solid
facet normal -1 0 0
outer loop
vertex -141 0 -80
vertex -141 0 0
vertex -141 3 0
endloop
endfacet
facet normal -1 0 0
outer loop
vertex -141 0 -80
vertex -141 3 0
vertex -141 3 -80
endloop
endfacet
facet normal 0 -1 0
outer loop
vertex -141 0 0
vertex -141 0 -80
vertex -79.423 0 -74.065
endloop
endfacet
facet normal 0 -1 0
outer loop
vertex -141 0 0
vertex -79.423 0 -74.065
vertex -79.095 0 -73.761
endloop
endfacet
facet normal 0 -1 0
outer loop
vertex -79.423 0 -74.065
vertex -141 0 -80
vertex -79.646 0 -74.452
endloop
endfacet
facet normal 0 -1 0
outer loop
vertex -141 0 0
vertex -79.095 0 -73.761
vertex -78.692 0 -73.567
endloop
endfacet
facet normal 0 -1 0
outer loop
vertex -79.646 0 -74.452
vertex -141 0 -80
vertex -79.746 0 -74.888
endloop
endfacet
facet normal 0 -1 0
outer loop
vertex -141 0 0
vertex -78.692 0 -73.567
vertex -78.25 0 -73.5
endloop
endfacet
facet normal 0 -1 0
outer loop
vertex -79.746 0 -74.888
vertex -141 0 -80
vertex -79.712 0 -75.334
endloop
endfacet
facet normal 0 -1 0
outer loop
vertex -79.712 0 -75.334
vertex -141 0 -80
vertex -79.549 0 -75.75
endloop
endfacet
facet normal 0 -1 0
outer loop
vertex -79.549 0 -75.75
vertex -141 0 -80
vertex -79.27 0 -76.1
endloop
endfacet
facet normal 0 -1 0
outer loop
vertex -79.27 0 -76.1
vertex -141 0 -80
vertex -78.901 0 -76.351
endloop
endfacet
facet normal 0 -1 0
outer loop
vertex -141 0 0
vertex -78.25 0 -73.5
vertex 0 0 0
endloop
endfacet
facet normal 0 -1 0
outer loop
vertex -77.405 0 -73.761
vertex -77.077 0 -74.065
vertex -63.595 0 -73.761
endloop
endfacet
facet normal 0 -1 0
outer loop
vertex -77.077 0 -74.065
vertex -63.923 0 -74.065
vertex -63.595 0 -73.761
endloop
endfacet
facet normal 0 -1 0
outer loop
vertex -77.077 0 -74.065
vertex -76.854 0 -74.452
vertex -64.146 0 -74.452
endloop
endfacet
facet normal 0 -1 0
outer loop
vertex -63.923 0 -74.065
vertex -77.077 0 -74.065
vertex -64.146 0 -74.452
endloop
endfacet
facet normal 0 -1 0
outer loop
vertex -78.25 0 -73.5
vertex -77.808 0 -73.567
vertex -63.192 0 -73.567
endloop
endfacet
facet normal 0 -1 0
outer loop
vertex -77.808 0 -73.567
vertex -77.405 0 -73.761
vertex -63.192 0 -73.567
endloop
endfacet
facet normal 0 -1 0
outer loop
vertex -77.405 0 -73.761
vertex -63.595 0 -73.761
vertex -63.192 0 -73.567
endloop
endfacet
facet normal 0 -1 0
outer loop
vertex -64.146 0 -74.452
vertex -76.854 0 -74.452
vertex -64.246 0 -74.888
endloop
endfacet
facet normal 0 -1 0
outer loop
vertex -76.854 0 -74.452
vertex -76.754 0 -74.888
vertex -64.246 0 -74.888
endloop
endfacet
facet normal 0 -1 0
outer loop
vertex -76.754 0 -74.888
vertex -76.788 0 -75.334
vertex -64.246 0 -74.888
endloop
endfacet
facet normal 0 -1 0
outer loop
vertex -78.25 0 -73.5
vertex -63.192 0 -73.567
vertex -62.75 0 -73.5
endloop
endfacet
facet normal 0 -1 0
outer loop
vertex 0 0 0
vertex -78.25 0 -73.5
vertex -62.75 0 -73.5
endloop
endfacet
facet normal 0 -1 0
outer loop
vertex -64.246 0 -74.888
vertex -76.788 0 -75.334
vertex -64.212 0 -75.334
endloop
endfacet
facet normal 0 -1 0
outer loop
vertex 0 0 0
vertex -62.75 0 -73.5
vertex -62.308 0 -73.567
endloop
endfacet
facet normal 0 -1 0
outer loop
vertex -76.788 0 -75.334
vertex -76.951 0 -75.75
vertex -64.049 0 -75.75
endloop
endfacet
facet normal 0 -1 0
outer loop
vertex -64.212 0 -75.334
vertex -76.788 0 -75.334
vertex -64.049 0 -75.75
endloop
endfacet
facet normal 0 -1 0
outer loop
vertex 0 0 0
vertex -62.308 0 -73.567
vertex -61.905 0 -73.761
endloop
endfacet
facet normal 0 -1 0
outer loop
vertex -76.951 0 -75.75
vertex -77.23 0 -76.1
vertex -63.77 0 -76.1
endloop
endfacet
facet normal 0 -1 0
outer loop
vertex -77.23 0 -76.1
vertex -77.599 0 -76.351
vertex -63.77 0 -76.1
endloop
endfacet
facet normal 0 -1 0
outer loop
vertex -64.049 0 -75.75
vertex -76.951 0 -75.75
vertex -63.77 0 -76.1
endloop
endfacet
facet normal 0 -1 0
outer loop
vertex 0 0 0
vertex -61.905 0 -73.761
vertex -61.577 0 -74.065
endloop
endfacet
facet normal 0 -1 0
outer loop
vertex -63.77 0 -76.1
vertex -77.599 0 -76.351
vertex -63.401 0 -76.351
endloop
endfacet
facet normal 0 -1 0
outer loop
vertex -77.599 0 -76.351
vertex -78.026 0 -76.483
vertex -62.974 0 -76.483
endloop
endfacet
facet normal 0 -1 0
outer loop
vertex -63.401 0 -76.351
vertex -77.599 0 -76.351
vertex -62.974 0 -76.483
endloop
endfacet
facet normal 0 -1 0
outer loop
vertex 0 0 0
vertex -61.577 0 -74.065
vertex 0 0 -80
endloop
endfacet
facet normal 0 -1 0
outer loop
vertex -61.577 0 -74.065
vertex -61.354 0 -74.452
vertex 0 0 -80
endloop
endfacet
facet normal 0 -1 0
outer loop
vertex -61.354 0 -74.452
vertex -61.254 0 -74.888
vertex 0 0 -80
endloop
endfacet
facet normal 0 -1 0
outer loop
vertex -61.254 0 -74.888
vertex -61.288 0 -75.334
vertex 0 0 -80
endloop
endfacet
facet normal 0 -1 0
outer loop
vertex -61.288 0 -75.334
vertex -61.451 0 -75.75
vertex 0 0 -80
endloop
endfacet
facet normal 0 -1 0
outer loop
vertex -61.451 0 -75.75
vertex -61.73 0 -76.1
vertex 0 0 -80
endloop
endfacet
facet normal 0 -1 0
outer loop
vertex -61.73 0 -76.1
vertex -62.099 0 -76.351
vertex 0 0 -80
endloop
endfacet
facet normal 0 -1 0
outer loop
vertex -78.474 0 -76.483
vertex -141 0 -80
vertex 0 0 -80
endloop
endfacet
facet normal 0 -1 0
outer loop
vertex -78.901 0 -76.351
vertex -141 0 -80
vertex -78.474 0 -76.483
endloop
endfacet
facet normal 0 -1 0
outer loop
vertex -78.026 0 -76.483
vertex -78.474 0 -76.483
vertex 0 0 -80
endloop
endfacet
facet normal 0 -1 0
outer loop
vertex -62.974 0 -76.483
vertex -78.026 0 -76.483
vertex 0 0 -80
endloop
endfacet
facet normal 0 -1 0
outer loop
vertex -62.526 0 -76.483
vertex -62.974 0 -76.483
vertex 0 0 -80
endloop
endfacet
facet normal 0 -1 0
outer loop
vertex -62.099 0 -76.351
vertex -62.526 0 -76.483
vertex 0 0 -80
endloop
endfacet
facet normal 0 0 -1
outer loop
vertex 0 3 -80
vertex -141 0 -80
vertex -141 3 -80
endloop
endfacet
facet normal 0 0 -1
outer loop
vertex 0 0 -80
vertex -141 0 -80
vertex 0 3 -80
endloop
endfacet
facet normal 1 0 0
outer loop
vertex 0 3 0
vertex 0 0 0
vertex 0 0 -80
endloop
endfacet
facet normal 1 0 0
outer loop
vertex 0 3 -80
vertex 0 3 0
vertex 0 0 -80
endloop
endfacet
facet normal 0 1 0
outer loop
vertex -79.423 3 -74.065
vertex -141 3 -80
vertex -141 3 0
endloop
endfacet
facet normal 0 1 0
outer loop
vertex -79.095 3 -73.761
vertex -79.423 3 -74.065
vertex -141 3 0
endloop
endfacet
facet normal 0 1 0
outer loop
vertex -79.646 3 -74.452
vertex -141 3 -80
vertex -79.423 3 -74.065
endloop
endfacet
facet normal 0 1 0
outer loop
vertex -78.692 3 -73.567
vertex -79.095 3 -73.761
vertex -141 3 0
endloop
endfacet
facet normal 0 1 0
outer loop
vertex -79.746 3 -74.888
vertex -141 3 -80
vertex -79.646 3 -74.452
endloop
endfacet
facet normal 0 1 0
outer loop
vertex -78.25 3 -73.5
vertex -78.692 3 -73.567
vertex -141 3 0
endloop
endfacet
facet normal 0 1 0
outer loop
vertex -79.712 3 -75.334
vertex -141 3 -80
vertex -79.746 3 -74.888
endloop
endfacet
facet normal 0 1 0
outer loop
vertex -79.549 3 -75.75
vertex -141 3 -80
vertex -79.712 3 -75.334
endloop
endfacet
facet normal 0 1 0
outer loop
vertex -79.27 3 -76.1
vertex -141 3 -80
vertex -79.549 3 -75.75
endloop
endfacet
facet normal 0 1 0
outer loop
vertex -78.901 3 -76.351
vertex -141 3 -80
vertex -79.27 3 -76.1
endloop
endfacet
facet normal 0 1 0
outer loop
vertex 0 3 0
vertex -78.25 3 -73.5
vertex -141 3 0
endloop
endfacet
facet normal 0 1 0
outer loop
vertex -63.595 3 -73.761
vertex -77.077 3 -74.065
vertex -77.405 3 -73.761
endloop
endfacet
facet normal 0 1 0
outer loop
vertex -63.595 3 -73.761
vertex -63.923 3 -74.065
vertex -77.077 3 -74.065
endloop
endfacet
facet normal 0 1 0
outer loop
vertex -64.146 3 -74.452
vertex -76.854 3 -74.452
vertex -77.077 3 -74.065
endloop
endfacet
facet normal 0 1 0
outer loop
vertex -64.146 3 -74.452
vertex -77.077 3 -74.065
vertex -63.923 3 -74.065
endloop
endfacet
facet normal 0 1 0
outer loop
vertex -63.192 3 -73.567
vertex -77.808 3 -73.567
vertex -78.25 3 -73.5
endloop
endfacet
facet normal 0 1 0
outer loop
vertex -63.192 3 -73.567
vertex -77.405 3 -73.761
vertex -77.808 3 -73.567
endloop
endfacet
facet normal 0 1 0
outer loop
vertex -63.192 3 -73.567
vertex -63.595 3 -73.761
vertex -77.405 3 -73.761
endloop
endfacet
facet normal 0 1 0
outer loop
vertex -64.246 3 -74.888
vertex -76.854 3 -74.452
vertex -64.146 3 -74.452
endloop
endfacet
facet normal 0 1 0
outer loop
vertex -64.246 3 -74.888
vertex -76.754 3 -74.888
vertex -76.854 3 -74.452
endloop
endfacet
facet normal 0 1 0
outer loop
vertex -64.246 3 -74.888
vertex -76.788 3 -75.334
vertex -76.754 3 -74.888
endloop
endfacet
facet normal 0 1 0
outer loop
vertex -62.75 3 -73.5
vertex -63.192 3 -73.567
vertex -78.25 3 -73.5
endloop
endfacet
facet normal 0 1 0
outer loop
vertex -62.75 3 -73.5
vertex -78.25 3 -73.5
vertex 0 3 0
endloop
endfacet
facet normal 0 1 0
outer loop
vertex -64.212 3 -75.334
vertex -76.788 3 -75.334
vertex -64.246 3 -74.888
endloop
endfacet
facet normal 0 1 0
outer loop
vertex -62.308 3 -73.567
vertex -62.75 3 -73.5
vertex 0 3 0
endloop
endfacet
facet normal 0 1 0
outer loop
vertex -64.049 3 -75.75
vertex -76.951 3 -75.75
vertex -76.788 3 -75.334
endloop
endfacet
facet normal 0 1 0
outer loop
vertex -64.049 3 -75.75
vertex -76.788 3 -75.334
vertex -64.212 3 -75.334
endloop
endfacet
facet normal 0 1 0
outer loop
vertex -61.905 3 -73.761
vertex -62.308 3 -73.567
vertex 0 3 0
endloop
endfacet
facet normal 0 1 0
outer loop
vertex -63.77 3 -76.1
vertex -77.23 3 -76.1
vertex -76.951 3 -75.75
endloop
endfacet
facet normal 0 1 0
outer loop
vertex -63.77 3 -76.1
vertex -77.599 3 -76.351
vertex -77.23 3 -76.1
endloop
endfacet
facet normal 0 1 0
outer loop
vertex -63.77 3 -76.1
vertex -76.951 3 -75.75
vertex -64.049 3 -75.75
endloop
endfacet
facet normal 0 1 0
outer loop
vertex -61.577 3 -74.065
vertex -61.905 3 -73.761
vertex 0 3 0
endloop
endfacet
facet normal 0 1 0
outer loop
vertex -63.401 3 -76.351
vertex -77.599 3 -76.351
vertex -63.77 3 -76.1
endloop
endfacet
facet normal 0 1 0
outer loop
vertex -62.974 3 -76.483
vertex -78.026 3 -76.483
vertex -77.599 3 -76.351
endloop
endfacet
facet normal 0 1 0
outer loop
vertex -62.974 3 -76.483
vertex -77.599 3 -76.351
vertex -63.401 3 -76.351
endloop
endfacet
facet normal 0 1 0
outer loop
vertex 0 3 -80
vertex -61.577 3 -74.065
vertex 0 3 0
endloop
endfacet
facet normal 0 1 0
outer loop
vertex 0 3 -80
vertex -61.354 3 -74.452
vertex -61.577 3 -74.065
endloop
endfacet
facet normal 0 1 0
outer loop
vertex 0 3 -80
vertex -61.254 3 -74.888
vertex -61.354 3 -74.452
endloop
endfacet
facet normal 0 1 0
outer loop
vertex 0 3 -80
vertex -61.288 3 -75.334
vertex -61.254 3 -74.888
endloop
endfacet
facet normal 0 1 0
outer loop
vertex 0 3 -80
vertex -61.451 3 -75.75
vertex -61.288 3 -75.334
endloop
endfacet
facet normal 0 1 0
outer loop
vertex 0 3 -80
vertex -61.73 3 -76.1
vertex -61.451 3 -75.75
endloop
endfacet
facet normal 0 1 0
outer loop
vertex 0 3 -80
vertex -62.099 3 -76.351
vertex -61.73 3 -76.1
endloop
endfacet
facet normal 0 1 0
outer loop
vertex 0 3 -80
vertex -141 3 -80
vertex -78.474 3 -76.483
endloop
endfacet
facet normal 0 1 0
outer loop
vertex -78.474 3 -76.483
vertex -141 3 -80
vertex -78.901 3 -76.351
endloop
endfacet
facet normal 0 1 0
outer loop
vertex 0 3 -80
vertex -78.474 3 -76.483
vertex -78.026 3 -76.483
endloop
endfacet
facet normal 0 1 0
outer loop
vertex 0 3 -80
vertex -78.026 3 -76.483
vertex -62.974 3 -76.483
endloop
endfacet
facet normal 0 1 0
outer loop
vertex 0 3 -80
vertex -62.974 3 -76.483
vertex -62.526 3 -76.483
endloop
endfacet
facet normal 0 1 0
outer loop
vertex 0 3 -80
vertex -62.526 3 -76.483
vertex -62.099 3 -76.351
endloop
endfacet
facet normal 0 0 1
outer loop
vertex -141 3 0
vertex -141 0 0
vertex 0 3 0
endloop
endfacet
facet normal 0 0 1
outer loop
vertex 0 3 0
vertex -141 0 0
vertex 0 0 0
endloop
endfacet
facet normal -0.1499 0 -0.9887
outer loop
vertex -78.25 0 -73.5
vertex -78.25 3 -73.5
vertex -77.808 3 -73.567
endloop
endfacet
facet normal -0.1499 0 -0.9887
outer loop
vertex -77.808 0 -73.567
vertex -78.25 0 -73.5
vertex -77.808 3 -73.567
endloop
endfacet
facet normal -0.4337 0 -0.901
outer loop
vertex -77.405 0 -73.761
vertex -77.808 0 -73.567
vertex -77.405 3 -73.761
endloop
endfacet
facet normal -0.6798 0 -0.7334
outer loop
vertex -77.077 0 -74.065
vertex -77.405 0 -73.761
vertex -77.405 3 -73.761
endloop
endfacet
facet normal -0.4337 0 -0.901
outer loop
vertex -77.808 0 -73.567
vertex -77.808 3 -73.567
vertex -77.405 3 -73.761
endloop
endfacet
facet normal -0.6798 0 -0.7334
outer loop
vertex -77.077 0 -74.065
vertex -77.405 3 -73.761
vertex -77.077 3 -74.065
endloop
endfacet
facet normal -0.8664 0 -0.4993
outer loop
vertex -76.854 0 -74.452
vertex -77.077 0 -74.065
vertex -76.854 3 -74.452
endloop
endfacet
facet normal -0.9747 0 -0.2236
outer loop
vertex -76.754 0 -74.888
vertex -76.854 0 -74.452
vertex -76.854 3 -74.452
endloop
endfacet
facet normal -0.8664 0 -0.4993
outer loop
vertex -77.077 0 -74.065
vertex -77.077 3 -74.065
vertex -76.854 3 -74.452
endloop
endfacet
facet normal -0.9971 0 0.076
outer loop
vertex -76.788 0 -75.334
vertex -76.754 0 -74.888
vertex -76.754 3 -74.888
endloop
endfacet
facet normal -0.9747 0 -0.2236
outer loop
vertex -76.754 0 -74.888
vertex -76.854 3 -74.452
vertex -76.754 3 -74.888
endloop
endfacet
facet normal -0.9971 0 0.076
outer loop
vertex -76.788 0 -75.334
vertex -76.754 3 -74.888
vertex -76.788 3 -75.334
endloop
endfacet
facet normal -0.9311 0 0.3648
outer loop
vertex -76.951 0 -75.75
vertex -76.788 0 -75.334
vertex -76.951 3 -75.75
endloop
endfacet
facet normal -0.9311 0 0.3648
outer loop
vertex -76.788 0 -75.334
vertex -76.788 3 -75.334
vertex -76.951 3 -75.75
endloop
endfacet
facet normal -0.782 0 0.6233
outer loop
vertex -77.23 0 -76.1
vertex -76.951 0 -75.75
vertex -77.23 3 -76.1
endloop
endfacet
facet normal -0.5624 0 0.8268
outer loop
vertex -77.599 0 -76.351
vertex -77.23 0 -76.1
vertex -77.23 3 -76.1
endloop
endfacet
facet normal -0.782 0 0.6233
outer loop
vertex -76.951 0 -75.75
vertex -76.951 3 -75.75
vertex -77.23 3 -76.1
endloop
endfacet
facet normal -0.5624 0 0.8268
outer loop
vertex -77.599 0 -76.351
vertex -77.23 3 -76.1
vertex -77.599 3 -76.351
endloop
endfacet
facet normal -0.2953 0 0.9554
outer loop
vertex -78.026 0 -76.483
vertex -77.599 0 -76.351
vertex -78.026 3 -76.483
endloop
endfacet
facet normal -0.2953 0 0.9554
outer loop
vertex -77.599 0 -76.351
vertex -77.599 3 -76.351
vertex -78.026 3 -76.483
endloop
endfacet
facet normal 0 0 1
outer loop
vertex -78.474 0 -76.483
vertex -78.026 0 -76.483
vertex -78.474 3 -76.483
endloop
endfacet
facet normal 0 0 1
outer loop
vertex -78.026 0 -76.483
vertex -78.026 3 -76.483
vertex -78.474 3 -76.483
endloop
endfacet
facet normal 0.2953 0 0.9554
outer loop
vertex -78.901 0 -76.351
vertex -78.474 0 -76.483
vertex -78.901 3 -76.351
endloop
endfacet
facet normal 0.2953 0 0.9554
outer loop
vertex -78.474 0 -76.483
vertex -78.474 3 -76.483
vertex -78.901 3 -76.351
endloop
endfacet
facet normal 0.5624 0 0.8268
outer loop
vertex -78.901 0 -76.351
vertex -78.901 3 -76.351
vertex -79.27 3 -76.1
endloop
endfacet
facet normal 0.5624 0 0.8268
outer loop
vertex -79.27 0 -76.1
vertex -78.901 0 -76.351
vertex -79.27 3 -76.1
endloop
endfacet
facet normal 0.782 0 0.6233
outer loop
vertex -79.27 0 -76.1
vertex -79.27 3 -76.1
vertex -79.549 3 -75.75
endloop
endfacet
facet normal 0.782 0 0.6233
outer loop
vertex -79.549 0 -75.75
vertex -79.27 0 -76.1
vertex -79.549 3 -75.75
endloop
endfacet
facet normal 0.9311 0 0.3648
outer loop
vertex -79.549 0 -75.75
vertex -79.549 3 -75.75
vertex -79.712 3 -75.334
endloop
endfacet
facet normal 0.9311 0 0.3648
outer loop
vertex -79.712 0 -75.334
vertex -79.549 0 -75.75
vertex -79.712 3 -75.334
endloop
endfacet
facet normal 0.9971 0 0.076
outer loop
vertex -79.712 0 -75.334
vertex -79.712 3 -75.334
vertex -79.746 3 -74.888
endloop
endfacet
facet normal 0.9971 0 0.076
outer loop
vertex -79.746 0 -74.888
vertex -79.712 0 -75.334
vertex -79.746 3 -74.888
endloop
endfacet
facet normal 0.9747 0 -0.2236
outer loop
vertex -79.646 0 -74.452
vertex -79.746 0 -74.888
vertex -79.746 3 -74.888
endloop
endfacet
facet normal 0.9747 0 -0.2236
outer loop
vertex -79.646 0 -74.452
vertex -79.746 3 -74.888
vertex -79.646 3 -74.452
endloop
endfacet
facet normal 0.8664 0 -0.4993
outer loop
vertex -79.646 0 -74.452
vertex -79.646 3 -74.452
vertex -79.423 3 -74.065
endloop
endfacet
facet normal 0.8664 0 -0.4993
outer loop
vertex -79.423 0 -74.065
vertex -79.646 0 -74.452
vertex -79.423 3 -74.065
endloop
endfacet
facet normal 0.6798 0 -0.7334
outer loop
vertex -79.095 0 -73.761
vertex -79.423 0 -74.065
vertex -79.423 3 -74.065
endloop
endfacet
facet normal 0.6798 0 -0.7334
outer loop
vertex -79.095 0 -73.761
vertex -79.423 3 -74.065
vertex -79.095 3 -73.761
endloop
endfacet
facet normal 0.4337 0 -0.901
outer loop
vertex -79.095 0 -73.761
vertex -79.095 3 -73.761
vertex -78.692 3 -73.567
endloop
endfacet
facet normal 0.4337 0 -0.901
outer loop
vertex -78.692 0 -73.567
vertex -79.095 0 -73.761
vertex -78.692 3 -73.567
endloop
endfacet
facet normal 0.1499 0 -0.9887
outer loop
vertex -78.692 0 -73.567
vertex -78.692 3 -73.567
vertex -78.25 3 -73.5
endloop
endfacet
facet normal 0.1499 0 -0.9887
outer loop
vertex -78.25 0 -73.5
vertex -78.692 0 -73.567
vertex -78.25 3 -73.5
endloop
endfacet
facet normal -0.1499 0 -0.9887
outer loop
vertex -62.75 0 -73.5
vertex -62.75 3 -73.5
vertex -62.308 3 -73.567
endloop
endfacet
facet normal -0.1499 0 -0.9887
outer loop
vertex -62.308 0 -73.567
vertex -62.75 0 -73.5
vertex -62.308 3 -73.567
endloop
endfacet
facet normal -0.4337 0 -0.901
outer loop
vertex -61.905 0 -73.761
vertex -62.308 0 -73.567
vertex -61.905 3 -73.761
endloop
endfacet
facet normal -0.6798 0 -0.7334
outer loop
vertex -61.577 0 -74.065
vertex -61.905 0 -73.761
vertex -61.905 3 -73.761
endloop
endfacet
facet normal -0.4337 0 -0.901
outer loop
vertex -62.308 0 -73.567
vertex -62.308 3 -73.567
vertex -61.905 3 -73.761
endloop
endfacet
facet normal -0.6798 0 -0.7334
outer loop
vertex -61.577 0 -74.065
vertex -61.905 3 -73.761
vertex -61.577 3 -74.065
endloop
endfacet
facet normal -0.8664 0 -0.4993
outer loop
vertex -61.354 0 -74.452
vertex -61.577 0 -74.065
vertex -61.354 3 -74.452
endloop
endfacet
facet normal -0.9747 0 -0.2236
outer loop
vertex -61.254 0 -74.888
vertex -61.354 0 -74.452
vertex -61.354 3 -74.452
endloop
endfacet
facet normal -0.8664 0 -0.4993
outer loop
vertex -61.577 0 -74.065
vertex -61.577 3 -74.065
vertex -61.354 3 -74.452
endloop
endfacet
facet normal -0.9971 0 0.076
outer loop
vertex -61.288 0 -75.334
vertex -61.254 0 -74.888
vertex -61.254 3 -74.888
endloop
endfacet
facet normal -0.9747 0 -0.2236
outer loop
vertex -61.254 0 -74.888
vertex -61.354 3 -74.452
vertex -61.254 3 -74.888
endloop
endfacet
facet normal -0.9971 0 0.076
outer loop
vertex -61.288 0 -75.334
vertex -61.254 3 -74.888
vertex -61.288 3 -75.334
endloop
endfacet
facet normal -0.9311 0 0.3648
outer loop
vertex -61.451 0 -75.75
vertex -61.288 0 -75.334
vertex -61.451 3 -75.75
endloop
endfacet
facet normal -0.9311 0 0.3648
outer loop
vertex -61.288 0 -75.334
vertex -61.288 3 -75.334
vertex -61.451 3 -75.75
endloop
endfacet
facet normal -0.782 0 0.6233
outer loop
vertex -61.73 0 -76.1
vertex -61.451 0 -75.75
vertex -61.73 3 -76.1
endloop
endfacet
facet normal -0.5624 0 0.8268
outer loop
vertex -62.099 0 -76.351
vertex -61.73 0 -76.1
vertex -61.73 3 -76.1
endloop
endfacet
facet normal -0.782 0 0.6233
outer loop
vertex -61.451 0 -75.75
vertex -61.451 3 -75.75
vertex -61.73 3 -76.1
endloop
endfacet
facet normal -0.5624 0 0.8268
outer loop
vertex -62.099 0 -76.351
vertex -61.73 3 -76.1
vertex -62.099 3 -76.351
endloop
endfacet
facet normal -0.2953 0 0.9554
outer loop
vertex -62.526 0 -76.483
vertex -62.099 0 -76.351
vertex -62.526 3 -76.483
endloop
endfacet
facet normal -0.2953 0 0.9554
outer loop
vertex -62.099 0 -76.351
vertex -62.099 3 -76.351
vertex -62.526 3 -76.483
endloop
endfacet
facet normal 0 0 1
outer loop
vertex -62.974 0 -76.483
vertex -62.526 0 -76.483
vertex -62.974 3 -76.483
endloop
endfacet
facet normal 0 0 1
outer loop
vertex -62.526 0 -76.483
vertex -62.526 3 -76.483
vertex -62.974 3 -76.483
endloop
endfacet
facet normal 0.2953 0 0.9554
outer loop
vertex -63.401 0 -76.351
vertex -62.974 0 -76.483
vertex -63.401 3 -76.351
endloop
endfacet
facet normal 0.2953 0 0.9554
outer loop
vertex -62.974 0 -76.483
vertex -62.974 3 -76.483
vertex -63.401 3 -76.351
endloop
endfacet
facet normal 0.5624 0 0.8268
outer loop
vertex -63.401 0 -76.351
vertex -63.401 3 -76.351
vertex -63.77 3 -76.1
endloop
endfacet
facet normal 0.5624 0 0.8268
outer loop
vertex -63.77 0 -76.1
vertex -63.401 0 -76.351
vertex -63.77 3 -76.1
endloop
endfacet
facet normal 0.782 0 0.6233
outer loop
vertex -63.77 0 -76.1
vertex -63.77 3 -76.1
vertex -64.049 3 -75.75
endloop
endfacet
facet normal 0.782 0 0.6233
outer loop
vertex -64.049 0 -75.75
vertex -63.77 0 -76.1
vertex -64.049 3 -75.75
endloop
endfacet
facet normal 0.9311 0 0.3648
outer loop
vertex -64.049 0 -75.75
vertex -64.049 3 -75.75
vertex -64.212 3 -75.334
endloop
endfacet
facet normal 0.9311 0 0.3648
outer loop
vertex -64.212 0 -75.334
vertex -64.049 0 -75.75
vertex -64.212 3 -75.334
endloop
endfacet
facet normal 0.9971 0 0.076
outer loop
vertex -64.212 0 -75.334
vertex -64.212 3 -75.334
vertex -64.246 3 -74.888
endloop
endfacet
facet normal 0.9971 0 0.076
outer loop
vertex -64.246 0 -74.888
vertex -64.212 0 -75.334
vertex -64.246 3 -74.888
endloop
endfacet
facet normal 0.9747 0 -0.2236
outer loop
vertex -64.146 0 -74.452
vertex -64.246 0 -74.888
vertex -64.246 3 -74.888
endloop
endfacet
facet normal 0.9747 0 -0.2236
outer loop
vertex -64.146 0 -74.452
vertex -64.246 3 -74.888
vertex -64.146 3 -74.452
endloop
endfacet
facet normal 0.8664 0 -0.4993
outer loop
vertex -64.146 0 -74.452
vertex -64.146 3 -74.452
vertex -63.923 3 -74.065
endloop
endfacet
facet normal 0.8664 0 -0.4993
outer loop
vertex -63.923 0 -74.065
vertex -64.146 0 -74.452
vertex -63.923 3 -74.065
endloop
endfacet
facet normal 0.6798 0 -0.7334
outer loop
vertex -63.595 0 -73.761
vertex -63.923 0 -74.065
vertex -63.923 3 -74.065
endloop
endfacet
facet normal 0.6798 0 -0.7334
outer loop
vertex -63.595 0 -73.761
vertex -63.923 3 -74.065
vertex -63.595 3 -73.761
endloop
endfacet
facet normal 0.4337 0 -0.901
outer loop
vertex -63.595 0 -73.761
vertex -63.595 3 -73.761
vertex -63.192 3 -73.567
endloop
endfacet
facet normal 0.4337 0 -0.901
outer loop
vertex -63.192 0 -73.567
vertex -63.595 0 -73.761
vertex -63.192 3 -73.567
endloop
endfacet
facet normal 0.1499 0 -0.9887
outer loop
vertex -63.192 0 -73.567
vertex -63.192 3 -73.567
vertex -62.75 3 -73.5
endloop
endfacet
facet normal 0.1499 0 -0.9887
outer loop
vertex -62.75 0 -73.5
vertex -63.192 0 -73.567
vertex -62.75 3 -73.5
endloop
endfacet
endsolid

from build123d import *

# Parameters (mm, degrees)
SKETCH_1_W          = 141
SKETCH_1_H          = 80
EXTRUDE_1_DEPTH     = 3
SKETCH_2_R          = 1.5
CUT_EXTRUDE_1_DEPTH = 4
SKETCH_3_R          = 1.5
CUT_EXTRUDE_2_DEPTH = 4


with BuildPart() as part:
    # ｽｹｯﾁ1 → ﾎﾞｽ - 押し出し1 (new body)
    with BuildSketch(Plane(origin=(0, 0, 0), x_dir=(1, 0, 0), z_dir=(0, 1, 0))):
        with Locations((-70.5, 40)):
            Rectangle(SKETCH_1_W, SKETCH_1_H)
    extrude(amount=EXTRUDE_1_DEPTH)

    # ｽｹｯﾁ2 → ｶｯﾄ - 押し出し1 (cut, through all)
    with BuildSketch(Plane(origin=(0, 3, 0), x_dir=(1, 0, 0), z_dir=(0, 1, 0))):
        with Locations(Location((-78.25, 75, 0), (0, 0, 270))):  # turned: the seam where the file's is
            Circle(SKETCH_2_R)
    extrude(amount=-CUT_EXTRUDE_1_DEPTH, mode=Mode.SUBTRACT)

    # ｽｹｯﾁ3 → ｶｯﾄ - 押し出し2 (cut, through all)
    with BuildSketch(Plane(origin=(0, 3, 0), x_dir=(1, 0, 0), z_dir=(0, 1, 0))):
        with Locations(Location((-62.75, 75, 0), (0, 0, 270))):  # turned: the seam where the file's is
            Circle(SKETCH_3_R)
    extrude(amount=-CUT_EXTRUDE_2_DEPTH, mode=Mode.SUBTRACT)


solid = part.part
